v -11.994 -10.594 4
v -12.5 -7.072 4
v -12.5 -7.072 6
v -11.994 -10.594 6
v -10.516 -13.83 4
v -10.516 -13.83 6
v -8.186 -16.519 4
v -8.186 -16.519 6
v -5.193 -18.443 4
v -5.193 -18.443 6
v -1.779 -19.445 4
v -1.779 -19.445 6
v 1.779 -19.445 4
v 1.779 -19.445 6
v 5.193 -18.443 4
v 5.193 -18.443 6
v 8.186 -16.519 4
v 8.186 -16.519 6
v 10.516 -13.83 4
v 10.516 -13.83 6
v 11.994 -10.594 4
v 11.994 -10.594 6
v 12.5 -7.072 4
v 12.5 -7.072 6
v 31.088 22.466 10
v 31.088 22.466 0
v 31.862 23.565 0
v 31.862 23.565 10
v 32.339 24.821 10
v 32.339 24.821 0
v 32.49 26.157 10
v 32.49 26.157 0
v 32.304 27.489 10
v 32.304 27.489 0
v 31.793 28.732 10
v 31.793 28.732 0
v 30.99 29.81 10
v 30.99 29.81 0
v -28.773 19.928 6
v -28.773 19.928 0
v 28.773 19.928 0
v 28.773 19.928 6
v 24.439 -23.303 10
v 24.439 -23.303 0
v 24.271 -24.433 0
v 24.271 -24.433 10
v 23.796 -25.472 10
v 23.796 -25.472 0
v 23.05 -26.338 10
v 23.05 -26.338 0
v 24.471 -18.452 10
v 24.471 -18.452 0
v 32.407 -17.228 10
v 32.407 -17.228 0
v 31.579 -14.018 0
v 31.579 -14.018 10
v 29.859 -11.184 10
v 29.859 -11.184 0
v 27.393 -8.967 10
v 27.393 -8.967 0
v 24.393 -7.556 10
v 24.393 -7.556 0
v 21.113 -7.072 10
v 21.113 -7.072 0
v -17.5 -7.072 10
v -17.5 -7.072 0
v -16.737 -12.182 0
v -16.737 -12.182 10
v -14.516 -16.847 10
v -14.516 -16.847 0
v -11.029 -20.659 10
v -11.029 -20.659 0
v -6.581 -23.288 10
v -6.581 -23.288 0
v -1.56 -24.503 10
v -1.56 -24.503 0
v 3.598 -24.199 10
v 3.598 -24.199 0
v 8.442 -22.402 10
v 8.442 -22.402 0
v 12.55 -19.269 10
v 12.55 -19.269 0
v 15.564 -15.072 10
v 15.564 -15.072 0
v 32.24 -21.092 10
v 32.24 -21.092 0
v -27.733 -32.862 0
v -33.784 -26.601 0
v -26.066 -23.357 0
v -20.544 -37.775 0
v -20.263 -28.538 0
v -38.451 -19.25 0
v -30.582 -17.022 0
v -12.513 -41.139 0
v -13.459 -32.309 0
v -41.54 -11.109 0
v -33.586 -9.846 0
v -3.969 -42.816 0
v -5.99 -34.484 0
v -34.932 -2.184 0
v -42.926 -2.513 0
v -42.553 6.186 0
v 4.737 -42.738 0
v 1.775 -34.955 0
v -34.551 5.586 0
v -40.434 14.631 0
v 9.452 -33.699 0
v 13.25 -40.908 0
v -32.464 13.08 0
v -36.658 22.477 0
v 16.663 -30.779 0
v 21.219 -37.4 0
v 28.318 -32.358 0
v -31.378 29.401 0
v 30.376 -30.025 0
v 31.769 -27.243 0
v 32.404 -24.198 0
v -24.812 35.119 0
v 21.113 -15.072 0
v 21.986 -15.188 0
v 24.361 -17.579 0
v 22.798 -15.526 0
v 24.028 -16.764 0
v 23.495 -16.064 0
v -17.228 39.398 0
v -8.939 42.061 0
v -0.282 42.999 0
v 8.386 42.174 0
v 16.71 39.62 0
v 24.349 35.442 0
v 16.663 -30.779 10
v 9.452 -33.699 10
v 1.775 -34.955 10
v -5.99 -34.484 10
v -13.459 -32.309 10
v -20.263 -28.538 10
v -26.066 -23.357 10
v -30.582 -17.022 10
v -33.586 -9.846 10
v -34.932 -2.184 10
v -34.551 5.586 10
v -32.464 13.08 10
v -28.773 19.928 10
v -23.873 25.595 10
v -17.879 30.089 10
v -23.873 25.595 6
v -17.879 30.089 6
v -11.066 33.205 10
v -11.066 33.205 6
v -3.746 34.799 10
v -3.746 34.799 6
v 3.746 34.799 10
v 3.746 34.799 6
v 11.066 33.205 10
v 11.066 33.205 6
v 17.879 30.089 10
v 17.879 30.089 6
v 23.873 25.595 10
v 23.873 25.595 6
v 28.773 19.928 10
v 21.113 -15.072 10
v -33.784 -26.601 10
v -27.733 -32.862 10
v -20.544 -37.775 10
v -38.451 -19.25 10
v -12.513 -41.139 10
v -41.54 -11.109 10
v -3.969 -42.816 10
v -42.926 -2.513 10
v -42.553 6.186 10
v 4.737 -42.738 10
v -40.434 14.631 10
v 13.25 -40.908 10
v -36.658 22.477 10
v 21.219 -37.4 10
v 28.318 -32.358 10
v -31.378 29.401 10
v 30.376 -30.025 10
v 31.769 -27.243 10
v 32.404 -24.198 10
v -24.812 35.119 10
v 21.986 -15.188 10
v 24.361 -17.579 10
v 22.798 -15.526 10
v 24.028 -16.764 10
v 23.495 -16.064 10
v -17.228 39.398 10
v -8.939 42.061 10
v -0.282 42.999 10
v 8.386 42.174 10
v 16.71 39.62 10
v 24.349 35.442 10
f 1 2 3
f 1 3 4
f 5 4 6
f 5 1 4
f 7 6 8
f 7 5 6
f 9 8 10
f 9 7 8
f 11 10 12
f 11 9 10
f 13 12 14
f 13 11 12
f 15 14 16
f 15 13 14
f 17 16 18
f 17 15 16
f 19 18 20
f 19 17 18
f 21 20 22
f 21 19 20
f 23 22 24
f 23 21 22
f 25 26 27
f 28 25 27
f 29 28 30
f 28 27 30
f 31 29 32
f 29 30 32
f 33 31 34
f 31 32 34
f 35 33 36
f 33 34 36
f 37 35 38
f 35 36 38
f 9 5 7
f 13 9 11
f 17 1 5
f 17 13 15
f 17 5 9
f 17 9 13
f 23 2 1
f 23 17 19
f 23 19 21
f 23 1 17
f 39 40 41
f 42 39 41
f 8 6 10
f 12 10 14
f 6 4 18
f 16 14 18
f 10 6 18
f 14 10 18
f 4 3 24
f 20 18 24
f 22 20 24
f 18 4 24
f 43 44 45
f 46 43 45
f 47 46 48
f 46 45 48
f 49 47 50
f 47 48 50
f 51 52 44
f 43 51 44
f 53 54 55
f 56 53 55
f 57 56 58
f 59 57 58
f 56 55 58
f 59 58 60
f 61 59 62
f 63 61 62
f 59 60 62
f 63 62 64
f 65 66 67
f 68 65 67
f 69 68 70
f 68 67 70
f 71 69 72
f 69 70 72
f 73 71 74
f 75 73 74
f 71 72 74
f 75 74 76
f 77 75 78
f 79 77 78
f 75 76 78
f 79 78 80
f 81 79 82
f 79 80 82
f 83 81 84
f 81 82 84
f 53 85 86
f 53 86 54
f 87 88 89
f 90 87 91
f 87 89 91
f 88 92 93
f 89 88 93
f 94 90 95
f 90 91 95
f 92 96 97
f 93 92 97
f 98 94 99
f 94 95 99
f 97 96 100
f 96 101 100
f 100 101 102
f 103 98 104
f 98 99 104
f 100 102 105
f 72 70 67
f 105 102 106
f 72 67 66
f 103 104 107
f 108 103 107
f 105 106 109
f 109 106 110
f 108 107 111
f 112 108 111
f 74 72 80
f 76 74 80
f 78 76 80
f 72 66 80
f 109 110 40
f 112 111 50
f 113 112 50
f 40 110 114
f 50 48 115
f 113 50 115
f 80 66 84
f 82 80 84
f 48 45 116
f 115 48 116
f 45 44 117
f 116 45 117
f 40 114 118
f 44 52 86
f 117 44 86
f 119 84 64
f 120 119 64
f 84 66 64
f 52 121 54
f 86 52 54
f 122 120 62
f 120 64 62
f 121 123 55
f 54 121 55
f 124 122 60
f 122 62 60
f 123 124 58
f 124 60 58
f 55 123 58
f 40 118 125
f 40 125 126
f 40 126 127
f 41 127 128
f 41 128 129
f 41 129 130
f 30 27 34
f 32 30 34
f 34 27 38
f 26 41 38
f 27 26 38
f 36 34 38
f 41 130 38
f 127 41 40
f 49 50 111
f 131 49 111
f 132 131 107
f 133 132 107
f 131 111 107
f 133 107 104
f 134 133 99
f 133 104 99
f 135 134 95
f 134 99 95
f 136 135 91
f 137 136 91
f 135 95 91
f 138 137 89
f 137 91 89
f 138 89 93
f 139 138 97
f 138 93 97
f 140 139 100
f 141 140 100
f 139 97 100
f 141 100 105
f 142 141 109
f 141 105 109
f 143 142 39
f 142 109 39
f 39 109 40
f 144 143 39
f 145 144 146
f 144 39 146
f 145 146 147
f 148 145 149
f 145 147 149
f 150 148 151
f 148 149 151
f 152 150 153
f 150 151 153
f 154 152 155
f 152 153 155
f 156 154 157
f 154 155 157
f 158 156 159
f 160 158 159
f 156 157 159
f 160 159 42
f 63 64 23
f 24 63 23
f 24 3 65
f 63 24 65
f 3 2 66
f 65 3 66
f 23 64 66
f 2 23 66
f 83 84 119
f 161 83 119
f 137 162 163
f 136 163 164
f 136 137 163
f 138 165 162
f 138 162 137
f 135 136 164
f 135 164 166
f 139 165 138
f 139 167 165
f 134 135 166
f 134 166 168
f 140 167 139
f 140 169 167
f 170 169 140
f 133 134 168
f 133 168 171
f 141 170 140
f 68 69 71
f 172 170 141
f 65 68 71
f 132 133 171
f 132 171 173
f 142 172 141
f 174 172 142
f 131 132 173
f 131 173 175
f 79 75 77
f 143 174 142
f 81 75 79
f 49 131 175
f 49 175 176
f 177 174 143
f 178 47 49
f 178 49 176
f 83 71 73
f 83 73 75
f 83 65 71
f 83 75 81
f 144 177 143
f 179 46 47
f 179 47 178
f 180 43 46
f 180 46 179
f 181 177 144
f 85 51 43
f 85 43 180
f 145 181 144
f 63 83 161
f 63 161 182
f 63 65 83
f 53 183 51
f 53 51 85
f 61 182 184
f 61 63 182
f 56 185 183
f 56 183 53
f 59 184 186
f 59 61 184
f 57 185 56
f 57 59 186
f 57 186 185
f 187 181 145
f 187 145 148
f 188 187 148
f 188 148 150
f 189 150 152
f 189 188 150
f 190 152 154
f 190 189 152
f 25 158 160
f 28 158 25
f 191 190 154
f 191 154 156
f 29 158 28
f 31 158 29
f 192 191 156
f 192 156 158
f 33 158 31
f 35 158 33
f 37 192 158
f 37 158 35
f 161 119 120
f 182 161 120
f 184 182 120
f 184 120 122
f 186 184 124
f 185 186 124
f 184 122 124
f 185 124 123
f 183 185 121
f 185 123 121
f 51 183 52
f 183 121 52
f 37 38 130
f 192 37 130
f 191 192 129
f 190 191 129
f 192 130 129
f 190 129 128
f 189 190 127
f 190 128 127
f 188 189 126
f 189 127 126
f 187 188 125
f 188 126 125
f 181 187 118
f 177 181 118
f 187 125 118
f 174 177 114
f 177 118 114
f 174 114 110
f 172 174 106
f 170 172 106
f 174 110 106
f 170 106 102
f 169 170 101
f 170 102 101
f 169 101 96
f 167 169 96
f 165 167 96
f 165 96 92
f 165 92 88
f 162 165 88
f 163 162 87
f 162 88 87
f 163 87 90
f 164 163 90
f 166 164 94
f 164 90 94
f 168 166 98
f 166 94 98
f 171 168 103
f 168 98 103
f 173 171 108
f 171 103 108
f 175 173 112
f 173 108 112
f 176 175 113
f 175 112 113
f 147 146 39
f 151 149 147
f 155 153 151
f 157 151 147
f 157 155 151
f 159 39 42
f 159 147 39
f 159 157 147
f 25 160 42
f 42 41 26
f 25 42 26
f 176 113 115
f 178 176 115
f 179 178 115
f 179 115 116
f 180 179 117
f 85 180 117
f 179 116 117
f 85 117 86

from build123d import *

# Parameters (mm, degrees)
F1_DEPTH = 10
F2_DEPTH = 6
F3_DEPTH = 10
F4_START = 4
F4_DEPTH = 2


with BuildPart() as f1:
    # F0 (on Top) → F1 (new body)
    with BuildSketch(Plane.XY):
        with BuildLine():
            ThreePointArc((-28.7731093646, 19.9275732966), (0, 35), (28.7731093646, 19.9275732966))
            Line((28.7731093646, 19.9275732966), (31.0875692673, 22.4657579282))
            ThreePointArc((31.0875692673, 22.4657579282), (32.4897132735, 26.1572999971), (30.9896112585, 29.8101324057))
            ThreePointArc((30.9896112585, 29.8101324057), (-42.9603623337, 1.8458786953), (28.3184138379, -32.358421434))
            ThreePointArc((28.3184138379, -32.358421434), (31.7685286664, -27.2433524059), (32.2397786778, -21.0915114685))
            Line((32.2397786778, -21.0915114685), (32.4070255862, -17.2282779278))
            ThreePointArc((32.4070255862, -17.2282779278), (28.7073660358, -9.9847822061), (21.1130328535, -7.0724267034))
            Line((21.1130328535, -7.0724267034), (12.5, -7.0724267034))
            ThreePointArc((12.5, -7.0724267034), (0, -19.5724267034), (-12.5, -7.0724267034))
            Line((-12.5, -7.0724267034), (-17.5, -7.0724267034))
            ThreePointArc((-17.5, -7.0724267034), (-4.115416608, -24.0816402696), (15.5643824163, -15.0724267034))
            Line((15.5643824163, -15.0724267034), (21.1130328535, -15.0724267034))
            ThreePointArc((21.1130328535, -15.0724267034), (23.4950663605, -16.0636528083), (24.4707284781, -18.4521034048))
            Line((24.4707284781, -18.4521034048), (24.4390768882, -23.302781969))
            ThreePointArc((24.4390768882, -23.302781969), (24.0700935444, -24.9695381202), (23.0498717286, -26.3382500045))
            ThreePointArc((23.0498717286, -26.3382500045), (-23.3092355879, -26.108993399), (-28.7731093646, 19.9275732966))
        make_face()
    extrude(amount=F1_DEPTH)

    # F0 (on Top) → F2 (join)
    with BuildSketch(Plane.XY):
        with BuildLine():
            Line((-28.7731093646, 19.9275732966), (28.7731093646, 19.9275732966))
            ThreePointArc((28.7731093646, 19.9275732966), (0, 35), (-28.7731093646, 19.9275732966))
        make_face()
    extrude(amount=F2_DEPTH)

    # F0 (on Top) → F3 (join)
    with BuildSketch(Plane.XY):
        with BuildLine():
            ThreePointArc((-12.5, -7.0724267034), (0, -19.5724267034), (12.5, -7.0724267034))
            Line((12.5, -7.0724267034), (-12.5, -7.0724267034))
        make_face()
    extrude(amount=F3_DEPTH)

    # F0 (on Top) → F4 (cut)
    with BuildSketch(Plane.XY.offset(F4_START)):
        with BuildLine():
            ThreePointArc((-12.5, -7.0724267034), (0, -19.5724267034), (12.5, -7.0724267034))
            Line((12.5, -7.0724267034), (-12.5, -7.0724267034))
        make_face()
    extrude(amount=F4_DEPTH, mode=Mode.SUBTRACT)


solid = f1.part
